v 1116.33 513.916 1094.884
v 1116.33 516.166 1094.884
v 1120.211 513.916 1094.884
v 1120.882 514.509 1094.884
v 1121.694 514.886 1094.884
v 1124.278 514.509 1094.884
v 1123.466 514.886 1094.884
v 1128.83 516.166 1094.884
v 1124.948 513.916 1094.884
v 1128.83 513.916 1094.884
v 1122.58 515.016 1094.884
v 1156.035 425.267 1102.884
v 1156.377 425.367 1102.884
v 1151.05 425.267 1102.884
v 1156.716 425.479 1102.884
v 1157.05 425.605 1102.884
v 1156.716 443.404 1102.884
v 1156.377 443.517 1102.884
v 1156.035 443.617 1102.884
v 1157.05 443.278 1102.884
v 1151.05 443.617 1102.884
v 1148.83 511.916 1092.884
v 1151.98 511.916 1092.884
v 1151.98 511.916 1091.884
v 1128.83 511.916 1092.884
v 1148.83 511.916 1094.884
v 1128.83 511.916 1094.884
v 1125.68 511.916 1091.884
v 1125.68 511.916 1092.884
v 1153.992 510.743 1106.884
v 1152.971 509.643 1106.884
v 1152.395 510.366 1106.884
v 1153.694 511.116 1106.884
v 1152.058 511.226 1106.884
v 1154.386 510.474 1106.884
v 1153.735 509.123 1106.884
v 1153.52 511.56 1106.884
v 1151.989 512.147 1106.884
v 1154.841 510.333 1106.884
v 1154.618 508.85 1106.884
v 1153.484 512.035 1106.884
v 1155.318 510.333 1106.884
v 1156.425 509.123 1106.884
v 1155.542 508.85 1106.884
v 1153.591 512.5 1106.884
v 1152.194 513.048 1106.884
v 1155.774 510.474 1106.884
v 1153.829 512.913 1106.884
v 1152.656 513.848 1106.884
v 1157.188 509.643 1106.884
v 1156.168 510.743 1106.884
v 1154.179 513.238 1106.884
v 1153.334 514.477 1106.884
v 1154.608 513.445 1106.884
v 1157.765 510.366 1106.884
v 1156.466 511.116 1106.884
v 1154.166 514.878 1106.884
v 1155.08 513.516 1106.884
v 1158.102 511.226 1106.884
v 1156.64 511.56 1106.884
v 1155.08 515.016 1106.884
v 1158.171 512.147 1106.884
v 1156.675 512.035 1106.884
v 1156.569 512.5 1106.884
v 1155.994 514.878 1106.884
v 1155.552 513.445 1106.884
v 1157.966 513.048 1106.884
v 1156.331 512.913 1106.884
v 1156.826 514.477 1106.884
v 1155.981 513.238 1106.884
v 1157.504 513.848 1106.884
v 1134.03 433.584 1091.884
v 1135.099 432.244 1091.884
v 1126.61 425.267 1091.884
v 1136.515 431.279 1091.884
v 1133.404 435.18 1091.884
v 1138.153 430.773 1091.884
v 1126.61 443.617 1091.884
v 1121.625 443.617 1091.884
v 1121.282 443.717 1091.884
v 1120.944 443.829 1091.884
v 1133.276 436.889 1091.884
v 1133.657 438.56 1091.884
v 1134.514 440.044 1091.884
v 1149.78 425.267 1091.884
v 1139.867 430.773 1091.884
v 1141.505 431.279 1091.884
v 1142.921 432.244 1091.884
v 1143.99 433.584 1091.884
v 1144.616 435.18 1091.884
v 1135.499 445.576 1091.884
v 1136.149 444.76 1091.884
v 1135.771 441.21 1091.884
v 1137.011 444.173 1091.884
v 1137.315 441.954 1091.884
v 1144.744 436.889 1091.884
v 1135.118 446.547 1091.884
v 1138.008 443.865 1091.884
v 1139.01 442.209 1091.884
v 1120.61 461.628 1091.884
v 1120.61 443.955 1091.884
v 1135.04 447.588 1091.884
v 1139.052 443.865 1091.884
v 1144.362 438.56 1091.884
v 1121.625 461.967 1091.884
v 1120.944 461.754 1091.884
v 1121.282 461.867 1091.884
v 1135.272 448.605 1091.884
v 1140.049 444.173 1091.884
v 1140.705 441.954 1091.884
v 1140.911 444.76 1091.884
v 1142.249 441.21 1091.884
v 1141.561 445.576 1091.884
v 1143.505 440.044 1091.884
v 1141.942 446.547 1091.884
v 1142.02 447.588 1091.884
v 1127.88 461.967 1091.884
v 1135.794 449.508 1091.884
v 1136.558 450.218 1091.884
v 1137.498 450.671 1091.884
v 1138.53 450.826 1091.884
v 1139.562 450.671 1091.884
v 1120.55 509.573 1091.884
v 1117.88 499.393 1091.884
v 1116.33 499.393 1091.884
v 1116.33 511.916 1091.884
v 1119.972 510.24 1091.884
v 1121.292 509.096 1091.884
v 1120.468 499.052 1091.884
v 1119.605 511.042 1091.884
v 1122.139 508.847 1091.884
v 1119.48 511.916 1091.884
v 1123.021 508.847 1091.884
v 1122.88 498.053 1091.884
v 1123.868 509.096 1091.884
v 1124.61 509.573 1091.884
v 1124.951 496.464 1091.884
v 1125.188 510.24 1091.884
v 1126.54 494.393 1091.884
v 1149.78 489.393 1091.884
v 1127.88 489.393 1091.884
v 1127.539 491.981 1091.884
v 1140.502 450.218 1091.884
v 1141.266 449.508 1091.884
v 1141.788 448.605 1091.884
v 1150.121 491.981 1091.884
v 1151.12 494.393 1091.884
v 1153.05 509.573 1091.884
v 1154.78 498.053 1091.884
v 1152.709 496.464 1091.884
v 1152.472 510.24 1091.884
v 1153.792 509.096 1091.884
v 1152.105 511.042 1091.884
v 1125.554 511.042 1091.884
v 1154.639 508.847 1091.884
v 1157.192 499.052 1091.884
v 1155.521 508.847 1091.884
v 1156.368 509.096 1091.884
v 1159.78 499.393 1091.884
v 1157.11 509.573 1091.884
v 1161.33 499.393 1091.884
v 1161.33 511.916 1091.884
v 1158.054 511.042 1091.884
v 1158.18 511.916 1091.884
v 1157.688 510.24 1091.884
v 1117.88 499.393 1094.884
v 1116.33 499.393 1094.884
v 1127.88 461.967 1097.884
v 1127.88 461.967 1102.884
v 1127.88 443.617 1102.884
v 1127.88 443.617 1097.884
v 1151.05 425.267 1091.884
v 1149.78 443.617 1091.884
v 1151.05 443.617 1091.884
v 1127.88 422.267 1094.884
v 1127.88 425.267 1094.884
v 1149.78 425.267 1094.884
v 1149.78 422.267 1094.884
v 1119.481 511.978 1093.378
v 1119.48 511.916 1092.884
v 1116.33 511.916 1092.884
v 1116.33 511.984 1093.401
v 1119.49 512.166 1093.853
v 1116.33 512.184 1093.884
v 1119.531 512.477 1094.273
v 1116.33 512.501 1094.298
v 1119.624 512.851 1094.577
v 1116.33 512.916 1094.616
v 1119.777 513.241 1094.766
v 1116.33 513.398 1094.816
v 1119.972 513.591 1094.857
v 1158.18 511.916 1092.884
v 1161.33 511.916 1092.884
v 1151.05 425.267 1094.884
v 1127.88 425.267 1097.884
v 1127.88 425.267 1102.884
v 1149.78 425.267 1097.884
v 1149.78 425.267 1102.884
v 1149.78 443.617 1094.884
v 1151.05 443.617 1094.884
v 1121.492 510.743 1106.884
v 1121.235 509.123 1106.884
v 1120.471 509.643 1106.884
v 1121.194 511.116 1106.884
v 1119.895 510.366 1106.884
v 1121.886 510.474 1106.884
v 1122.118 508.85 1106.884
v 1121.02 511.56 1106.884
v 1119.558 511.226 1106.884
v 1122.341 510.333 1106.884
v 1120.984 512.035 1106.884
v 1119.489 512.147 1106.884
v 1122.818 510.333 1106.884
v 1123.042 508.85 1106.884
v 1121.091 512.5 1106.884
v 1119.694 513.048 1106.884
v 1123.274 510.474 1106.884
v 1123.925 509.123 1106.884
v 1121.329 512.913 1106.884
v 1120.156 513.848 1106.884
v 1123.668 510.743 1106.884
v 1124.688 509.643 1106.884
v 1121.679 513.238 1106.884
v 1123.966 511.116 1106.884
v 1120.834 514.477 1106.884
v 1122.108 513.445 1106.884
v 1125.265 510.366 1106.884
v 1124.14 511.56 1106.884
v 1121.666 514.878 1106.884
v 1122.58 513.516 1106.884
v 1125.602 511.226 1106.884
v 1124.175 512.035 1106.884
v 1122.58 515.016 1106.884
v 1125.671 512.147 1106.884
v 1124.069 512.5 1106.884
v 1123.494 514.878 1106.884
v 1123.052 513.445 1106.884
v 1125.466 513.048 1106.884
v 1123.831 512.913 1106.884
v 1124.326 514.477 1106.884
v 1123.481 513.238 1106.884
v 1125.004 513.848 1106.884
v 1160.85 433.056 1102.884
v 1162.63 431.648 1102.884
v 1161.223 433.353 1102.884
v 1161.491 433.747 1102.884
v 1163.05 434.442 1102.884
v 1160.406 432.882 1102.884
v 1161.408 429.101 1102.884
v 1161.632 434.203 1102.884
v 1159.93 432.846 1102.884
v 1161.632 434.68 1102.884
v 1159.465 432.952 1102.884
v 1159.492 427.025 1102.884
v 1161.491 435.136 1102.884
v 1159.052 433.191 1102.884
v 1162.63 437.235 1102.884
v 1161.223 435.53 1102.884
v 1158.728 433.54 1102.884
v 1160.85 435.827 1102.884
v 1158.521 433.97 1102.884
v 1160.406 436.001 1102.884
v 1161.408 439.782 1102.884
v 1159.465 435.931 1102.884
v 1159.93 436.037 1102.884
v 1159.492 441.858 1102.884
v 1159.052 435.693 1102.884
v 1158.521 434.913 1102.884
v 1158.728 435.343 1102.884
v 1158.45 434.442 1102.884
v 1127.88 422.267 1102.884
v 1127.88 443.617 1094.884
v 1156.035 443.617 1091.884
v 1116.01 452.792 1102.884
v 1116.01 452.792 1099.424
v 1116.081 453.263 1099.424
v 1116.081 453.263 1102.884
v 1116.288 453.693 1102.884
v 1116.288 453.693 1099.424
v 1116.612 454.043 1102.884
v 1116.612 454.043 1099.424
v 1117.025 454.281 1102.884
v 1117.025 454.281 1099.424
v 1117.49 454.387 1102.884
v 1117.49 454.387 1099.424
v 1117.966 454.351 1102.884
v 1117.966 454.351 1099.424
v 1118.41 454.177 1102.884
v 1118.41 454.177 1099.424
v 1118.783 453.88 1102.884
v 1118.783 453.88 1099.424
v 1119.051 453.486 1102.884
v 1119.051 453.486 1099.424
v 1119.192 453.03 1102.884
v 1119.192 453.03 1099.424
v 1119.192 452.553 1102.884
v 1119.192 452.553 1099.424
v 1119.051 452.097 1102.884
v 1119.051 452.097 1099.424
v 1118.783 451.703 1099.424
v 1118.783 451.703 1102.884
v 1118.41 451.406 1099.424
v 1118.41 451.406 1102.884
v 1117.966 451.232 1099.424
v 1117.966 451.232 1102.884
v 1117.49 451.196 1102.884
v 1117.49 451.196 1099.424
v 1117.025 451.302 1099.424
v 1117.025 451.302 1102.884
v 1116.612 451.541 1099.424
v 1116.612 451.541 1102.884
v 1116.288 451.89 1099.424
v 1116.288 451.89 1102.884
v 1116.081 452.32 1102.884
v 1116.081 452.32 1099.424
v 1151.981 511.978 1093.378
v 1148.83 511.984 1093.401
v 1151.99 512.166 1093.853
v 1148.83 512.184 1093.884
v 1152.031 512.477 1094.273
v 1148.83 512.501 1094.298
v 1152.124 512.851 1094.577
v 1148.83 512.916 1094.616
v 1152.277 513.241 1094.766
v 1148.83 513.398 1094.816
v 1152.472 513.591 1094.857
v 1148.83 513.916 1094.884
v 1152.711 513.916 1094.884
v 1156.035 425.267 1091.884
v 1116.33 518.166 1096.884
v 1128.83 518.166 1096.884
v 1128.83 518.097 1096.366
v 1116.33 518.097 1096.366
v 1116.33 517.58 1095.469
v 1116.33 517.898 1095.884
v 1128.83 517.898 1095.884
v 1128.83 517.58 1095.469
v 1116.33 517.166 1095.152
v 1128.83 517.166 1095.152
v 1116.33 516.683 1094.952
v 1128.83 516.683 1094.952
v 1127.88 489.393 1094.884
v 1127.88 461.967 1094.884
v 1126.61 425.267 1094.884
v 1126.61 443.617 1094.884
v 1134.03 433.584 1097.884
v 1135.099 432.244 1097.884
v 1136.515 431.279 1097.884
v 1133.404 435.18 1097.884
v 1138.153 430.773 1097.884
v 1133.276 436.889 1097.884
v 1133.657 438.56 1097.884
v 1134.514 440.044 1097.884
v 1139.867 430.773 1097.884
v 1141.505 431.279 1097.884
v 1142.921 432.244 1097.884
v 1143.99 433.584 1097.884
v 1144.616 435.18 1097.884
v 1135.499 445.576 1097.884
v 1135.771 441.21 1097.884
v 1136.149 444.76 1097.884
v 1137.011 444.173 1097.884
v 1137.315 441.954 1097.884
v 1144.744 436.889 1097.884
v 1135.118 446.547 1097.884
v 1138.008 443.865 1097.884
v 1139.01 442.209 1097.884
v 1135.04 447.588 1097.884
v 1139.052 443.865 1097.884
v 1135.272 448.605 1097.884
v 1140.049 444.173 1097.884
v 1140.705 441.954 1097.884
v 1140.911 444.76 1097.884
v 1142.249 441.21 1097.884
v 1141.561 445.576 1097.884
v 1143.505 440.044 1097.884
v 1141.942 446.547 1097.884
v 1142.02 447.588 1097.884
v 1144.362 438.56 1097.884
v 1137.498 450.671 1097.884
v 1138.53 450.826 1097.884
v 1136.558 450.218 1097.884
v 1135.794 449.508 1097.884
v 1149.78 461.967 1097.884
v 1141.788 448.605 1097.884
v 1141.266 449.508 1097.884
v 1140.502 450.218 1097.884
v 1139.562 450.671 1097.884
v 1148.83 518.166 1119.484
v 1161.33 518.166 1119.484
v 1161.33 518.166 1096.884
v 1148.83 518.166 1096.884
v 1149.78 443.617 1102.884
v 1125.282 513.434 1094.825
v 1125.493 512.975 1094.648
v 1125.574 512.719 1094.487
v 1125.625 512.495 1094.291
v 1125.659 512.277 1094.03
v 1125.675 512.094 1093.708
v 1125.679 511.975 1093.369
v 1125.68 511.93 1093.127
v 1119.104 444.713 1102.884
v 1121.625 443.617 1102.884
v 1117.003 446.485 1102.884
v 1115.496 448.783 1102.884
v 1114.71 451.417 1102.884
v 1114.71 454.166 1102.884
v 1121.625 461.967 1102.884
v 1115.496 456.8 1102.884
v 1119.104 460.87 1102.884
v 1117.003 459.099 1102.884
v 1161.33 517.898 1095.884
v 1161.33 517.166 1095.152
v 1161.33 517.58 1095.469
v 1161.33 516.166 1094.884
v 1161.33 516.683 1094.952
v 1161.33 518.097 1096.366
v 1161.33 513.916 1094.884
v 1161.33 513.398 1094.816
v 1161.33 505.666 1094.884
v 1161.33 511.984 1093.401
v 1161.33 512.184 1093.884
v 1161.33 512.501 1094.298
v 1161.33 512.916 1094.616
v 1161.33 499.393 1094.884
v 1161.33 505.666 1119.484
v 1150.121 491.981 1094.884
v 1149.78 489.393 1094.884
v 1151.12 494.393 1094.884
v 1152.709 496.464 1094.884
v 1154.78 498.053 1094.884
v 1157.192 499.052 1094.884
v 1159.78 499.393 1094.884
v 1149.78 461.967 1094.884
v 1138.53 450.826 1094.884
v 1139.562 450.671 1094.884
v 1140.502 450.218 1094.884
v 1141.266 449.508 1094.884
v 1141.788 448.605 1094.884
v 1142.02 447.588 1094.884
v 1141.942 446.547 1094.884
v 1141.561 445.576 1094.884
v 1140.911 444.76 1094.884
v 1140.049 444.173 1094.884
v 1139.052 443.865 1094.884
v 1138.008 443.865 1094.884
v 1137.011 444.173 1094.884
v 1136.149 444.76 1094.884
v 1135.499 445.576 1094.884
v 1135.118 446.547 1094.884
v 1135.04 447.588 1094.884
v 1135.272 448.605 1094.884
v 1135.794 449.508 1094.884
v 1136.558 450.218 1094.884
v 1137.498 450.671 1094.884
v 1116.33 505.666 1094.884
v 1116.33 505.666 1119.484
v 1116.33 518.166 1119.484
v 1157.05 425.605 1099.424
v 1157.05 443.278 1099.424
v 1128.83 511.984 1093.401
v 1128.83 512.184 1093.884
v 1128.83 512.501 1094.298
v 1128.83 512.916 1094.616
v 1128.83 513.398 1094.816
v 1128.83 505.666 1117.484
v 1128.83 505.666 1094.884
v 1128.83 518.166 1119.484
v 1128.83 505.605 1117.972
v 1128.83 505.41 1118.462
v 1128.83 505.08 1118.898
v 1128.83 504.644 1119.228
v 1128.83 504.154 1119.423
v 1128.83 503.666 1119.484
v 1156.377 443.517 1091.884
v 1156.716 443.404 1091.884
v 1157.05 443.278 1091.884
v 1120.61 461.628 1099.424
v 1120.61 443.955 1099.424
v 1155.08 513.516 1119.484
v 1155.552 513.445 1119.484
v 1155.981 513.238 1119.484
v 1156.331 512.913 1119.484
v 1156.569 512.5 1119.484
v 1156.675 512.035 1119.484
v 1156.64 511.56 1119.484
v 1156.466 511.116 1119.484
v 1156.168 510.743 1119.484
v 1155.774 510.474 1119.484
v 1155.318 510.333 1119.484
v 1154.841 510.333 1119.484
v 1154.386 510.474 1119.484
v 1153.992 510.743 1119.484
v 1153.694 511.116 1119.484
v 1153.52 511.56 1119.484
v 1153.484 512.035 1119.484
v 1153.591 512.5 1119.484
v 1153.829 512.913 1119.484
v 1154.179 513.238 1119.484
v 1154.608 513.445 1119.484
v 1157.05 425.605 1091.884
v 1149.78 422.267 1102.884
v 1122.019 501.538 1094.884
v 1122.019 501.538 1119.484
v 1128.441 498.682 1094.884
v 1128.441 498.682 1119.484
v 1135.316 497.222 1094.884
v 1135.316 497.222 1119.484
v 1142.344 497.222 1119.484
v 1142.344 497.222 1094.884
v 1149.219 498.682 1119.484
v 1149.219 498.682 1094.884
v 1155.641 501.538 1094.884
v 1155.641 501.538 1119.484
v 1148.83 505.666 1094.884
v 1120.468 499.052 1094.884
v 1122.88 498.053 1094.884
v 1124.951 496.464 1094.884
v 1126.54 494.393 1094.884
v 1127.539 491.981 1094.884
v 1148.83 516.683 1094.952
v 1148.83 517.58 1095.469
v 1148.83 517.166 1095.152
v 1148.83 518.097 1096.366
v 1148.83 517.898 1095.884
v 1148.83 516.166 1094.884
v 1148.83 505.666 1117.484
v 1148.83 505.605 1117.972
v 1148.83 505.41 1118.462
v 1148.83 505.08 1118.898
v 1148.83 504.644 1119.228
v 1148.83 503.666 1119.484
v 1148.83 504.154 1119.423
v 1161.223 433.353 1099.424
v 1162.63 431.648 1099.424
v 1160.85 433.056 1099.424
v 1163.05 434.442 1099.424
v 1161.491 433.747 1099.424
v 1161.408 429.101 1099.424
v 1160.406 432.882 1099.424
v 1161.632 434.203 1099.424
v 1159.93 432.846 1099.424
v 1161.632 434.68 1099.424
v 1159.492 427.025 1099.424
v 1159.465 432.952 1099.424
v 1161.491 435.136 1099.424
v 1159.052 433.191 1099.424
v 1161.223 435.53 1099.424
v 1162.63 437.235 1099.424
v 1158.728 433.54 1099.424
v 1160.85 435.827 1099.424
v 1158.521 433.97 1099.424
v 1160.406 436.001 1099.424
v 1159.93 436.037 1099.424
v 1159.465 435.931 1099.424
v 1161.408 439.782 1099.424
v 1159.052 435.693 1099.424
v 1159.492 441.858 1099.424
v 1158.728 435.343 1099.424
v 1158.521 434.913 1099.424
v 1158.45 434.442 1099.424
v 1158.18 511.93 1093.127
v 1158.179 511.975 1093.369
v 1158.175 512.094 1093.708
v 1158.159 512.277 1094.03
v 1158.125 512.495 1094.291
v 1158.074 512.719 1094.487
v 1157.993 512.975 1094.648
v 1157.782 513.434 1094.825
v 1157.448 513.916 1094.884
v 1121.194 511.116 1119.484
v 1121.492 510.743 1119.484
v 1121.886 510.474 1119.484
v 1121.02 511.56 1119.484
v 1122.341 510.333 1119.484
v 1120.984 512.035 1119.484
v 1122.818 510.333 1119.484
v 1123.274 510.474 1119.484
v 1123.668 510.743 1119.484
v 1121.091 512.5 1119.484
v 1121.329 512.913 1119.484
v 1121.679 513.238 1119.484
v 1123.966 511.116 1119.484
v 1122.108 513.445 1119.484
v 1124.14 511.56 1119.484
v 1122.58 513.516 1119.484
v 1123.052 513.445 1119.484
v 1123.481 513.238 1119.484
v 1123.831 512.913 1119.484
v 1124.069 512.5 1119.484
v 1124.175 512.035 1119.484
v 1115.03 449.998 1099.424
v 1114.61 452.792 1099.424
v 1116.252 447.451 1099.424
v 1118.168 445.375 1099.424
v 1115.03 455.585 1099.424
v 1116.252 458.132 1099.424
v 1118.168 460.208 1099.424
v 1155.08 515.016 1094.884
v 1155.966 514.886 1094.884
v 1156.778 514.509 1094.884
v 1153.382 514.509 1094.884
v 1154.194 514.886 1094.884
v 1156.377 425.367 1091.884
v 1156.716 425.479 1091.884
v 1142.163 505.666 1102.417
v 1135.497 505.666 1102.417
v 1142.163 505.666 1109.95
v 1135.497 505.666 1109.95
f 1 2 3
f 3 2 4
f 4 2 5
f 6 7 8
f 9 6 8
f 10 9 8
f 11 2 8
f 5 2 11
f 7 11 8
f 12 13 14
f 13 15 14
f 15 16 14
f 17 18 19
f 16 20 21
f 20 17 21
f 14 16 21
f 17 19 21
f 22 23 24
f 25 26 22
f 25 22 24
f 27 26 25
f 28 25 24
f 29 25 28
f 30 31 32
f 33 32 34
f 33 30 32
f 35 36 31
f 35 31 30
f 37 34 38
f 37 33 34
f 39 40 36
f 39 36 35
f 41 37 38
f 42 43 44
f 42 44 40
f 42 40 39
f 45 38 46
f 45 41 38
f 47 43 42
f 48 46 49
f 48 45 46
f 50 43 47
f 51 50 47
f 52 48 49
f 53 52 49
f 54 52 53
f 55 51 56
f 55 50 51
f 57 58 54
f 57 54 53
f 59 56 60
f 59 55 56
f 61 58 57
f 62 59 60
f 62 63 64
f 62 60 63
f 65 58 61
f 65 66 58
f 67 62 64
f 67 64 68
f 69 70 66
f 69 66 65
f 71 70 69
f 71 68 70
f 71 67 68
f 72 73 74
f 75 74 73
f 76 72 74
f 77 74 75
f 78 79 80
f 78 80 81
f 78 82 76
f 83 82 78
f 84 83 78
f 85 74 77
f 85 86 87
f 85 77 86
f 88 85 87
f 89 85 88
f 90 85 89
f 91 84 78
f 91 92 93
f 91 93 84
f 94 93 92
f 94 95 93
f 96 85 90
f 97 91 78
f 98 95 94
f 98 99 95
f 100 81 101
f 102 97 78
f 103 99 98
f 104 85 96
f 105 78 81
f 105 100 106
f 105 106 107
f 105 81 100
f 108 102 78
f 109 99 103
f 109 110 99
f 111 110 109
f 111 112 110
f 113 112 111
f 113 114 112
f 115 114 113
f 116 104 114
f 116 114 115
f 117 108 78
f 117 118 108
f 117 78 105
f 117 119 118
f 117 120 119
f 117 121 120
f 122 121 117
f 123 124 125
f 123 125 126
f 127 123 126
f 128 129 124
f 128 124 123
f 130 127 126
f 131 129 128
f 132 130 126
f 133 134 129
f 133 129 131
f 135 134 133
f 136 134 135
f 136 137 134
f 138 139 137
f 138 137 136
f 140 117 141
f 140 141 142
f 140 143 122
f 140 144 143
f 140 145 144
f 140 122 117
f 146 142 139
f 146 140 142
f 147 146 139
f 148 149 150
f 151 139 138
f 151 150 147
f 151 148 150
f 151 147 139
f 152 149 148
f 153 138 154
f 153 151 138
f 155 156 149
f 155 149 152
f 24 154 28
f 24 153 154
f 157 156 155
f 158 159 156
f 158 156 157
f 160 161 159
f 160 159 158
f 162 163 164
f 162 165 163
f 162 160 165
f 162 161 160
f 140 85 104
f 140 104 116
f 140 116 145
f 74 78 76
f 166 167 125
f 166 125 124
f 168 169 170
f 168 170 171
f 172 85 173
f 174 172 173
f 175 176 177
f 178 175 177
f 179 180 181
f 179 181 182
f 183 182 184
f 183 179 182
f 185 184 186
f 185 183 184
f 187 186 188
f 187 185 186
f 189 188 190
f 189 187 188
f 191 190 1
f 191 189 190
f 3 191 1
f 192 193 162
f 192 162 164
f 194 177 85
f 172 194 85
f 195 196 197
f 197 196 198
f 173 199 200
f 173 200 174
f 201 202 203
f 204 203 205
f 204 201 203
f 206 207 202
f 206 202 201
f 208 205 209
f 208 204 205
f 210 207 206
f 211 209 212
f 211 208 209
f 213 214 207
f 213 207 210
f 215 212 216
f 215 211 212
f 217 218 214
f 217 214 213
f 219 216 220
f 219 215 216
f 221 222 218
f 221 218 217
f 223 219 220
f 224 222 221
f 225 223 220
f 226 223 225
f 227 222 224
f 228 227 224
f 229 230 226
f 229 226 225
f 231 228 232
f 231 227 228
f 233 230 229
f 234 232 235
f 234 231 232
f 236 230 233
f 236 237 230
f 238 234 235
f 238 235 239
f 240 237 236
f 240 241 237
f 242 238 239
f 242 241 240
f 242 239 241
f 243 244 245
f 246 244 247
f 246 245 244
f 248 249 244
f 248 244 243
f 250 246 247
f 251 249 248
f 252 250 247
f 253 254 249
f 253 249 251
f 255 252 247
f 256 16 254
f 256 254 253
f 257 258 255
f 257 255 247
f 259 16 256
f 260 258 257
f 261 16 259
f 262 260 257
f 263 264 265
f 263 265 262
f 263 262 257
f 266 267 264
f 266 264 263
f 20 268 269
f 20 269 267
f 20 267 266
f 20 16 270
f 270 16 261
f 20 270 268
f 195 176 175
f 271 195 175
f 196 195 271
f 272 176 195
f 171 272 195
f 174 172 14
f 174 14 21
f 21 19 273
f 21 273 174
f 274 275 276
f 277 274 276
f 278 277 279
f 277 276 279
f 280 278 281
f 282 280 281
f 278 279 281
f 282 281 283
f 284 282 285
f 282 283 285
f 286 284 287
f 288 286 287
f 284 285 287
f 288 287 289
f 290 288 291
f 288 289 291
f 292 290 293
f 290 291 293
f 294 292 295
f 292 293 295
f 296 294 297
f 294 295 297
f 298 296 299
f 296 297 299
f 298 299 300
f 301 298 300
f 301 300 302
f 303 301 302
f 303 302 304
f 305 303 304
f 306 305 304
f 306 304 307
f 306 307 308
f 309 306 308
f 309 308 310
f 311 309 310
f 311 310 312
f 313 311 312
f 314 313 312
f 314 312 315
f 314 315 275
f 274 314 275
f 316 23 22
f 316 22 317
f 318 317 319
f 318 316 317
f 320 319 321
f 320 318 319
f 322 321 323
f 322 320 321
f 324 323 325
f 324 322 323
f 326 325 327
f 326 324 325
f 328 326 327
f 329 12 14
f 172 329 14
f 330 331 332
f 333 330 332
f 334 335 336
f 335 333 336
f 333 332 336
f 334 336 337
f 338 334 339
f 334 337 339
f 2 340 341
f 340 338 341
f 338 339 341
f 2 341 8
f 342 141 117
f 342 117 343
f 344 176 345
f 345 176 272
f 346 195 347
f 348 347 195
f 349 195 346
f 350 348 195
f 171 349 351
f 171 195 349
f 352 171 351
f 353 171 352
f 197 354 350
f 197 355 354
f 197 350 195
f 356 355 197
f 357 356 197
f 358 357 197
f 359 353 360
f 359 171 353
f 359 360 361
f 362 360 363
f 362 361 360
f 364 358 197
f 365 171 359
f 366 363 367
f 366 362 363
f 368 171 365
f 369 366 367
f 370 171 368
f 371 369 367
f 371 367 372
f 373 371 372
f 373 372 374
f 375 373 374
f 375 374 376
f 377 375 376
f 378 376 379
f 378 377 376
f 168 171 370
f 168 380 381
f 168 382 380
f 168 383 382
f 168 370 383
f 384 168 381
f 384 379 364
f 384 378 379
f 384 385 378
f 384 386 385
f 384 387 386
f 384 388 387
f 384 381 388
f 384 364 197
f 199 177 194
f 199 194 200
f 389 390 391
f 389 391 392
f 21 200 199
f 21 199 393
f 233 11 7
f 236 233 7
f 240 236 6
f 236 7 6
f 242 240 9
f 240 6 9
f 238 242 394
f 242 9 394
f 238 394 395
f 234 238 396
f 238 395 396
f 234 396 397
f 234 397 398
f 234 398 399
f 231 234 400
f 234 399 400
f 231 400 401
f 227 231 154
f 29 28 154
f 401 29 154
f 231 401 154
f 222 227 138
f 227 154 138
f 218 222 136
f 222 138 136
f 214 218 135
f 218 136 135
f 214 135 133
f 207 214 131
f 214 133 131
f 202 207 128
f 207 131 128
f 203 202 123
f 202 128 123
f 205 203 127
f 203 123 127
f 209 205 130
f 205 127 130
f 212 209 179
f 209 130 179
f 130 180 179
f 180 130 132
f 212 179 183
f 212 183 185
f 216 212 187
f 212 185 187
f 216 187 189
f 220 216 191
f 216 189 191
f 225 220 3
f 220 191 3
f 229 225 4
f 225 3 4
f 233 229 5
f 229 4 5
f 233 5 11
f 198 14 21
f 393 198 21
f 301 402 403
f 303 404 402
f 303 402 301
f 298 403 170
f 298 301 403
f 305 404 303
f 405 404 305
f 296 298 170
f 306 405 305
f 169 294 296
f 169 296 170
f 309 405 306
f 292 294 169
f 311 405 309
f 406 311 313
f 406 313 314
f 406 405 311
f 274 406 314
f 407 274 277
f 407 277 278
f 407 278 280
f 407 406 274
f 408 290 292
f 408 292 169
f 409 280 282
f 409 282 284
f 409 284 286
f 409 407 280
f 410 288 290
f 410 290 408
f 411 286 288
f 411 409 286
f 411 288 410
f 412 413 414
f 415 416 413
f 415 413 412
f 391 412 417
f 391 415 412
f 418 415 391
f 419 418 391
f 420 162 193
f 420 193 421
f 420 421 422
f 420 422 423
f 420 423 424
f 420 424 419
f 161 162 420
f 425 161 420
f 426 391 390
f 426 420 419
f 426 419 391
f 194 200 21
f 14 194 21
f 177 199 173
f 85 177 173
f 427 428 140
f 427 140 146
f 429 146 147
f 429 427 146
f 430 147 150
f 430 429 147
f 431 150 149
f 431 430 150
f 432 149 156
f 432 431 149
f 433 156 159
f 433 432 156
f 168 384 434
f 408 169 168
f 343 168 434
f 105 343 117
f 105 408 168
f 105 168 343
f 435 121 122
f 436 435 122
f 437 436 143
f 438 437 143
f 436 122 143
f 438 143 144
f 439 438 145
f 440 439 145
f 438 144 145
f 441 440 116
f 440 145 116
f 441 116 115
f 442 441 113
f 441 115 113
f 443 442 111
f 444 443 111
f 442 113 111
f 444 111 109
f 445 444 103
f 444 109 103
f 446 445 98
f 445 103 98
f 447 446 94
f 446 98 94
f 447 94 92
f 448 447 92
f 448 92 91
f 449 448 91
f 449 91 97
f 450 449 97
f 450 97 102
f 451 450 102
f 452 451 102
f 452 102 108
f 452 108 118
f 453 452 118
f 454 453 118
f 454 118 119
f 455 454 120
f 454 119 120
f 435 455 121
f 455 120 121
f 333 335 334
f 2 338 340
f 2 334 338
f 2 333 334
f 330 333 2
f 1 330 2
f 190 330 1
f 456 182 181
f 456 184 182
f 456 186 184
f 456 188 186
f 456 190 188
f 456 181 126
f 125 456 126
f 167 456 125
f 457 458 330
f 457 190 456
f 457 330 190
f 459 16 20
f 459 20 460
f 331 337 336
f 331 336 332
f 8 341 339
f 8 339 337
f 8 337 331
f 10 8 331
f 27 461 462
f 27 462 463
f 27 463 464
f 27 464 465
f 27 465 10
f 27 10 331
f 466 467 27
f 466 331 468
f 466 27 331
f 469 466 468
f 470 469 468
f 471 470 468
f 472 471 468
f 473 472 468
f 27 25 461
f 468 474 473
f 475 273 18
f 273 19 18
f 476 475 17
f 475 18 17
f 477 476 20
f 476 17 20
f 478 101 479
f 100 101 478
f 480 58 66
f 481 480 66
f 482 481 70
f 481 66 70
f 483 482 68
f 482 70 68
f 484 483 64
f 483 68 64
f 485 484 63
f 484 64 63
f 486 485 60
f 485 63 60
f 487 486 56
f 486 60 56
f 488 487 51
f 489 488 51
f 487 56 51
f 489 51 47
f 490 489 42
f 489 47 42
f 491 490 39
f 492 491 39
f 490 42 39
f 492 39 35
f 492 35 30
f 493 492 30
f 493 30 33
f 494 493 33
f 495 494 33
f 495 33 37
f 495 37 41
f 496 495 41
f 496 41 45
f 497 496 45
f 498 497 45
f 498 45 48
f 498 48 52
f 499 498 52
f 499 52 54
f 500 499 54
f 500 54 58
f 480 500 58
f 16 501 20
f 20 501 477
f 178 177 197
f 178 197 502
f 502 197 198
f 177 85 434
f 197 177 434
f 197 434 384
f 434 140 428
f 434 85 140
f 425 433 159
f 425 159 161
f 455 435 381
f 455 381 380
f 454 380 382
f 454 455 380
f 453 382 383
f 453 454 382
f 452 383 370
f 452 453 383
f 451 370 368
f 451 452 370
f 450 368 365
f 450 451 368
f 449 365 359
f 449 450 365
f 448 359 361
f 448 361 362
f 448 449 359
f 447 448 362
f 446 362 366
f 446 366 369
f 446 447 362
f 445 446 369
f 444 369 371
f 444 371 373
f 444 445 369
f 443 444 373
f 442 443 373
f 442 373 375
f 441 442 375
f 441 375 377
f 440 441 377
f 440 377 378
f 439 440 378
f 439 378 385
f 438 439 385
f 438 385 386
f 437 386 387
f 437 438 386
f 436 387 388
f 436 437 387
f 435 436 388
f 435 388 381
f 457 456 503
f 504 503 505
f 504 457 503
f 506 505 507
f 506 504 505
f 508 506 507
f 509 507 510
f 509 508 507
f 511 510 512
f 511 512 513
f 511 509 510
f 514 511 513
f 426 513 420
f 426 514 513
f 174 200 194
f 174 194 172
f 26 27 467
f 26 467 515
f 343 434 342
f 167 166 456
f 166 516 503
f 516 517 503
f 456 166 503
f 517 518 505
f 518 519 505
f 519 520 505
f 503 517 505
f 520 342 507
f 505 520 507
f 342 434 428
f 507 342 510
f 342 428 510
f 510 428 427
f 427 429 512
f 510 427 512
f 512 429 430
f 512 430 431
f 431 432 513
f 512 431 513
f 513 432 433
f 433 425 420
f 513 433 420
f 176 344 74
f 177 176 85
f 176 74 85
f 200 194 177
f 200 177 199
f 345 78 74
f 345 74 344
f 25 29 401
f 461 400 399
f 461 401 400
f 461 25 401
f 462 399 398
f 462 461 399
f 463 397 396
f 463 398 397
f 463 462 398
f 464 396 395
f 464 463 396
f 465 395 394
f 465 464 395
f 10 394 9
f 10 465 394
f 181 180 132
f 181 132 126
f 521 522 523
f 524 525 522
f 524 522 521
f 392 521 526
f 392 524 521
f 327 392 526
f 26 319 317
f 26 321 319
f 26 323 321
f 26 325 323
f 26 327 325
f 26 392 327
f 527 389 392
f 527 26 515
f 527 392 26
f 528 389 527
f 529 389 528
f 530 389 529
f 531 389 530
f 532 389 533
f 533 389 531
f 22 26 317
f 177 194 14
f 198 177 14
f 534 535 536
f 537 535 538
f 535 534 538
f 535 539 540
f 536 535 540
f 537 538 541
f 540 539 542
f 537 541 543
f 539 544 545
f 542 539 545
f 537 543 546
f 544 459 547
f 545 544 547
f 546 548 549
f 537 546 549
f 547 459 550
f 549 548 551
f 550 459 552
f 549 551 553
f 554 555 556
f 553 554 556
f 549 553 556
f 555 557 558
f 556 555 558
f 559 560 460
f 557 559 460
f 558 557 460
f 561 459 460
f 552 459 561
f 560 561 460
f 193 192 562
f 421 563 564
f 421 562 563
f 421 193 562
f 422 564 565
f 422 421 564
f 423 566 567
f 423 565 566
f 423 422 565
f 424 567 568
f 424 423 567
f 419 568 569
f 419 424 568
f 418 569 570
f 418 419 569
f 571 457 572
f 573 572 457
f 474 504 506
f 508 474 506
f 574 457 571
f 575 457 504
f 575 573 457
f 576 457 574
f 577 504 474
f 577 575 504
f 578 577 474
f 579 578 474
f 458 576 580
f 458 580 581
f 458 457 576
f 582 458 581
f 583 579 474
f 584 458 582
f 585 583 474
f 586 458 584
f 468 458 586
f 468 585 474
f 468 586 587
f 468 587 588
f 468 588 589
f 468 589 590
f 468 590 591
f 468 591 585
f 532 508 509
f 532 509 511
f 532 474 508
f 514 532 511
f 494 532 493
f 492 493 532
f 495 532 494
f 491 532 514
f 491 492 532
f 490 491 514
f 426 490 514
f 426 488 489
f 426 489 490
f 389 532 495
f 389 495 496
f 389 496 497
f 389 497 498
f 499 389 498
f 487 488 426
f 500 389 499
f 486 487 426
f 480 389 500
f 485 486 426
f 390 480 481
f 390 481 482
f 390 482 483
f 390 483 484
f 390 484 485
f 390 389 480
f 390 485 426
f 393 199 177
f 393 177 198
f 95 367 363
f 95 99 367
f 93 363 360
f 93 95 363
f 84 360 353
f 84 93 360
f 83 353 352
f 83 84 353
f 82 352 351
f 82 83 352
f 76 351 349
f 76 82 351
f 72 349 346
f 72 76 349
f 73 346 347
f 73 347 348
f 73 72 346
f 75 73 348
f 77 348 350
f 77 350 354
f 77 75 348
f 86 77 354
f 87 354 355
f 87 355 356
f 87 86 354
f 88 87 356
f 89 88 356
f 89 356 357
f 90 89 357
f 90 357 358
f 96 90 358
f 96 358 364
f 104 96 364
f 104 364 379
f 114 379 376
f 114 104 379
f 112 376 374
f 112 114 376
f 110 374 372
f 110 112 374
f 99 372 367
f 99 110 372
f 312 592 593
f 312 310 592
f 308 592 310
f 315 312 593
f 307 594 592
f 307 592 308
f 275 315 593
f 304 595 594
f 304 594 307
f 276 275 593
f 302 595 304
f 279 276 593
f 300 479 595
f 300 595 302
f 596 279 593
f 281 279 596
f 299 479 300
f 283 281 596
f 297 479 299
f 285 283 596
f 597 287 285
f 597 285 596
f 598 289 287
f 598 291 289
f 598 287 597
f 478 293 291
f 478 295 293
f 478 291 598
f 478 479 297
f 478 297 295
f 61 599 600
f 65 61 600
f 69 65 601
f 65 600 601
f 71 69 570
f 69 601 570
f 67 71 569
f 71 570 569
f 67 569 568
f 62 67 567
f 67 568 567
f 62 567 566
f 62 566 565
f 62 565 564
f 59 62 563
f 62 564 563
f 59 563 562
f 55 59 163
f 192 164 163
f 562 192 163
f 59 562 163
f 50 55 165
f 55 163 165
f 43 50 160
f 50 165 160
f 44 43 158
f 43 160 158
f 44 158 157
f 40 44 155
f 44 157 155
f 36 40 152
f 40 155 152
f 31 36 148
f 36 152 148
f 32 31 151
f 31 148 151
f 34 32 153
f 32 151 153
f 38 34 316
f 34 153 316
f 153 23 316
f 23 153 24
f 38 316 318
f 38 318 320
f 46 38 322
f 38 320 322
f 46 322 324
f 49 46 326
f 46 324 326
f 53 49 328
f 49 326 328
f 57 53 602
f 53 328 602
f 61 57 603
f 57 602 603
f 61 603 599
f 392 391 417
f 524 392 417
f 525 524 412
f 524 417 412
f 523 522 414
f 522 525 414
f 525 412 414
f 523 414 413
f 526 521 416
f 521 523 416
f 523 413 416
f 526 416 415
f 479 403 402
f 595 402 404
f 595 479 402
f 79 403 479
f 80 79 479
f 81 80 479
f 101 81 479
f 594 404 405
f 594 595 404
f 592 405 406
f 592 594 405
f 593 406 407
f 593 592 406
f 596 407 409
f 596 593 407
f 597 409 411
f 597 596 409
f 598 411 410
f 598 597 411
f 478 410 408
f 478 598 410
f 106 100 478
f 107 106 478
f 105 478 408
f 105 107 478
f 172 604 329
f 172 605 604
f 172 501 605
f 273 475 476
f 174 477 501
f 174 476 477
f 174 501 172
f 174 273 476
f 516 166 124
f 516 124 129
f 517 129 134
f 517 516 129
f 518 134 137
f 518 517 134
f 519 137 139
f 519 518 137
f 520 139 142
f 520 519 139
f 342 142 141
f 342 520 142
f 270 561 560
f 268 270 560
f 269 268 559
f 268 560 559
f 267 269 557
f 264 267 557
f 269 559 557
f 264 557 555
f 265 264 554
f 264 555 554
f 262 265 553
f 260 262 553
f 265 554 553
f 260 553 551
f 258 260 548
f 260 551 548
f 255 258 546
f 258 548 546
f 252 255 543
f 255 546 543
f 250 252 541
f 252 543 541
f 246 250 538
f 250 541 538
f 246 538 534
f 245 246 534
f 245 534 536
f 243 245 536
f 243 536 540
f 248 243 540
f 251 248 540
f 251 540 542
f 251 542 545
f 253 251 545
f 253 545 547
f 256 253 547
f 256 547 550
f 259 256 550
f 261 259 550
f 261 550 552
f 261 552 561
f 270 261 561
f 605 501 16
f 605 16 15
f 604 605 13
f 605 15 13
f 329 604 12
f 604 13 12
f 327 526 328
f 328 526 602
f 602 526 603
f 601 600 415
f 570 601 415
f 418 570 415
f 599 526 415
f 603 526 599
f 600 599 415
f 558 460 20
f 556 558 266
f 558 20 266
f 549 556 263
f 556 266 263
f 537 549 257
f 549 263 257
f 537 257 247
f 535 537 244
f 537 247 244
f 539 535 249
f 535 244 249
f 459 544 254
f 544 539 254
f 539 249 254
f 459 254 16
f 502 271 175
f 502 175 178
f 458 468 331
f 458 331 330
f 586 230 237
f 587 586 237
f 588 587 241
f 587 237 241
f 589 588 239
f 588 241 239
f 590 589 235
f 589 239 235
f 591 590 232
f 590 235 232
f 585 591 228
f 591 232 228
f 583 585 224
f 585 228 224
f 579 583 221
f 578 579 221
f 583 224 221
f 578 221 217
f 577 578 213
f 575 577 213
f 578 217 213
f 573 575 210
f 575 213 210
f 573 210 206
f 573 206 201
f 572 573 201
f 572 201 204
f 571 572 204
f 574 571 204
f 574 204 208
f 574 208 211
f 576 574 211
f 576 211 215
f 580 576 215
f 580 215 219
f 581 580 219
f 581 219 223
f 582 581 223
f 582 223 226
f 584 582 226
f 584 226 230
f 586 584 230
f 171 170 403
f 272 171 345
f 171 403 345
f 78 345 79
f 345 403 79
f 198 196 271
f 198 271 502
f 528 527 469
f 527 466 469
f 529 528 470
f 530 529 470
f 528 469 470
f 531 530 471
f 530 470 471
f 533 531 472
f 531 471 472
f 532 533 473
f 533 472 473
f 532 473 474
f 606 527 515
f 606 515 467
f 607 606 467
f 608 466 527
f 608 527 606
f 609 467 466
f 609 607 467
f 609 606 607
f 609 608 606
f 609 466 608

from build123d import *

# Parameters (mm, degrees)
BOSS_EXTRUDE1_DEPTH     = 24.6
BOSS_EXTRUDE2_DEPTH     = 3
SKETCH5_W               = 21.9
SKETCH5_H               = 3
BOSS_EXTRUDE3_DEPTH     = 37
CUT_EXTRUDE1_REACH      = 1273.984
SKETCH7_R               = 5.75
SKETCH8_W               = 3
SKETCH8_H               = 36.7
BOSS_EXTRUDE4_DEPTH     = 1.27
SKETCH9_W               = 3
SKETCH9_H               = 18.35
BOSS_EXTRUDE5_DEPTH     = 6
SKETCH11_W              = 6
SKETCH11_H              = 18.35
BOSS_EXTRUDE6_DEPTH     = 8
SKETCH12_W              = 6
SKETCH12_H              = 18.35
BOSS_EXTRUDE7_DEPTH     = 6
SKETCH14_R              = 1.6
CUT_EXTRUDE2_DEPTH      = 1272.885826469
CUT_EXTRUDE3_DEPTH      = 1272.984495021
SKETCH17_R              = 1.6
CUT_EXTRUDE4_DEPTH      = 1272.984495021
FILLET5_R               = 2
SKETCH18_R              = 3.1
CUT_EXTRUDE5_DEPTH      = 15
FILLET8_R               = 2
SKETCH19_W              = 3
SKETCH19_H              = 18.35
BOSS_EXTRUDE9_DEPTH     = 1.27
SKETCH20_W              = 6
SKETCH20_H              = 18.35
BOSS_EXTRUDE10_DEPTH    = 11
SKETCH21_W              = 6
SKETCH21_H              = 18.35
BOSS_EXTRUDE12_DEPTH    = 6
SKETCH22_R              = 1.6
CUT_EXTRUDE6_DEPTH      = 1274.45651229
CUT_EXTRUDE7_DEPTH      = 1274.45651229
CUT_EXTRUDE7_DEPTH_BACK = 1274.45651229
SKETCH24_R              = 3.5
CUT_EXTRUDE9_DEPTH      = 3
SKETCH25_W              = 21.9
SKETCH25_H              = 36.7
SKETCH25_R              = 5.75
SKETCH25_R_2            = 3.5
BOSS_EXTRUDE13_DEPTH    = 3
SKETCH26_W              = 21.9
SKETCH26_H              = 8
BOSS_EXTRUDE14_DEPTH    = 3
SKETCH27_W              = 8
SKETCH27_H              = 18.35
BOSS_EXTRUDE15_DEPTH    = 1.27
SKETCH28_W              = 8
SKETCH28_H              = 18.35
BOSS_EXTRUDE17_DEPTH    = 1.27
SKETCH31_W              = 2.54
SKETCH31_H              = 17.673744651
CUT_EXTRUDE16_DEPTH     = 1235.317826103
SKETCH32_W              = 7.54
SKETCH32_H              = 18.35
CUT_EXTRUDE17_DEPTH     = 1235.317826103


with BuildPart() as part:
    # Sketch1 → Boss-Extrude1 (new body)
    with BuildSketch(Plane(origin=(0, 0, 1119.483697074), x_dir=(-1, 0, 0), z_dir=(0, 0, -1))):
        with BuildLine():
            Line((-1161.329927858, 505.6656047), (-1161.329927858, 518.1656047))
            Line((-1161.329927858, 518.1656047), (-1148.829927858, 518.1656047))
            Line((-1148.829927858, 518.1656047), (-1148.829927858, 505.6656047))
            add(Edge.make_bspline(
                [(-1148.829927858, 505.6656047), (-1142.163261192, 505.6656047), (-1135.496594525, 505.6656047), (-1128.829927858, 505.6656047)],
                knots=[0.277777778, 0.277777778, 0.277777778, 0.277777778, 0.722222222, 0.722222222, 0.722222222, 0.722222222], degree=3))
            Line((-1128.829927858, 505.6656047), (-1128.829927858, 518.1656047))
            Line((-1128.829927858, 518.1656047), (-1116.329927858, 518.1656047))
            Line((-1116.329927858, 518.1656047), (-1116.329927858, 505.6656047))
            ThreePointArc((-1116.329927858, 505.6656047), (-1138.829927858, 497.038297899), (-1161.329927858, 505.6656047))
        make_face()
    extrude(amount=BOSS_EXTRUDE1_DEPTH)

    # Sketch4 → Boss-Extrude2 (add)
    with BuildSketch(Plane(origin=(0, 0, 1094.883697074), x_dir=(-1, 0, 0), z_dir=(0, 0, -1))):
        with BuildLine():
            Line((-1149.779927858, 462.266600027), (-1149.779927858, 489.392833753))
            ThreePointArc((-1149.779927858, 489.392833753), (-1152.708860047, 496.463901565), (-1159.779927858, 499.392833753))
            Line((-1159.779927858, 499.392833753), (-1161.329927858, 499.392833753))
            Line((-1161.329927858, 499.392833753), (-1161.329927858, 511.9156047))
            Line((-1161.329927858, 511.9156047), (-1116.329927858, 511.9156047))
            Line((-1116.329927858, 511.9156047), (-1116.329927858, 499.392833753))
            Line((-1116.329927858, 499.392833753), (-1117.879927858, 499.392833753))
            ThreePointArc((-1117.879927858, 499.392833753), (-1124.95099567, 496.463901565), (-1127.879927858, 489.392833753))
            Line((-1127.879927858, 489.392833753), (-1127.879927858, 462.266600027))
            Line((-1127.879927858, 462.266600027), (-1149.779927858, 462.266600027))
        make_face()
    extrude(amount=BOSS_EXTRUDE2_DEPTH)

    # Sketch5 → Boss-Extrude3 (add)
    with BuildSketch(Plane.XZ.offset(-462.266600027)):
        with Locations((1138.829927858, 1093.383697074)):
            Rectangle(SKETCH5_W, SKETCH5_H)
    extrude(amount=BOSS_EXTRUDE3_DEPTH)

    # Sketch7 → Cut-Extrude1 (cut, up to next)
    with BuildSketch(Plane(origin=(0, 0, 1091.883697074), x_dir=(-1, 0, 0), z_dir=(0, 0, -1)), mode=Mode.PRIVATE) as cut_extrude1_sk1:
        with Locations(Location((-1139.009861583, 436.459083358, 0), (0, 0, 90))):
            Circle(SKETCH7_R)
    cut_extrude1_tool1 = extrude(cut_extrude1_sk1.sketch, amount=-CUT_EXTRUDE1_REACH, mode=Mode.PRIVATE) & part.part
    add(cut_extrude1_tool1.solids().sort_by_distance((1139.009862, 436.459083, 1091.883697))[0], mode=Mode.SUBTRACT)



with BuildPart() as body_2:
    # Sketch8 → Boss-Extrude4 (new body)
    with BuildSketch(Plane.ZY.offset(-1127.879927858)):
        with Locations((1093.383697074, 443.616600027)):
            Rectangle(SKETCH8_W, SKETCH8_H)
    extrude(amount=BOSS_EXTRUDE4_DEPTH)


with BuildPart() as part_1:
    add(part.part)

    add(body_2.part)  # Boss-Extrude5 merges body 2
    # Sketch9 → Boss-Extrude5 (add)
    with BuildSketch(Plane.ZY.offset(-1126.609927858)):
        with Locations((1093.383697074, 452.791600027)):
            Rectangle(SKETCH9_W, SKETCH9_H)
    extrude(amount=BOSS_EXTRUDE5_DEPTH)

    # Sketch11 → Boss-Extrude6 (add)
    with BuildSketch(Plane.XY.offset(1094.883697074)):
        with Locations((1123.609927858, 452.791600027)):
            Rectangle(SKETCH11_W, SKETCH11_H)
    extrude(amount=BOSS_EXTRUDE6_DEPTH)

    # Sketch12 → Boss-Extrude7 (add)
    with BuildSketch(Plane.ZY.offset(-1120.609927858)):
        with Locations((1099.883697074, 452.791600027)):
            Rectangle(SKETCH12_W, SKETCH12_H)
    extrude(amount=BOSS_EXTRUDE7_DEPTH)

    # Sketch14 → Cut-Extrude2 (cut, through all)
    with BuildSketch(Plane(origin=(0, 0, 1096.883697074), x_dir=(-1, 0, 0), z_dir=(0, 0, -1))):
        with Locations((-1117.609927858, 452.791600027)):
            Circle(SKETCH14_R)
    extrude(amount=-CUT_EXTRUDE2_DEPTH, mode=Mode.SUBTRACT)

    # Sketch16 → Cut-Extrude3 (cut, through all)
    with BuildSketch(Plane(origin=(0, 0, 1091.883697074), x_dir=(-1, 0, 0), z_dir=(0, 0, -1))):
        with BuildLine():
            Line((-1126.609927858, 461.966600027), (-1126.609927858, 463.878724732))
            Line((-1126.609927858, 463.878724732), (-1111.609927858, 463.878724732))
            Line((-1111.609927858, 463.878724732), (-1111.609927858, 441.878724732))
            Line((-1111.609927858, 441.878724732), (-1126.609927858, 441.878724732))
            Line((-1126.609927858, 441.878724732), (-1126.609927858, 443.616600027))
            ThreePointArc((-1126.609927858, 443.616600027), (-1114.609927858, 452.791600027), (-1126.609927858, 461.966600027))
        make_face()
    extrude(amount=-CUT_EXTRUDE3_DEPTH, mode=Mode.SUBTRACT)

    # Sketch17 → Cut-Extrude4 (cut, through all)
    with BuildSketch(Plane(origin=(0, 0, 1091.883697074), x_dir=(-1, 0, 0), z_dir=(0, 0, -1))):
        with Locations(Location((-1122.579927858, 511.9156047, 0), (0, 0, 90))):
            Circle(SKETCH17_R)
        with Locations(Location((-1155.079927858, 511.9156047, 0), (0, 0, 90))):
            Circle(SKETCH17_R)
    extrude(amount=-CUT_EXTRUDE4_DEPTH, mode=Mode.SUBTRACT)

    # Fillet5
    # the kernel refuses this fillet: 2 mm, written as the material it adds along each edge
    with BuildSketch(Plane(origin=(1128.829927858, 511.9156047, 1094.883697074), x_dir=(0, 0, -1), z_dir=(-1, 0, 0))) as fillet5_piece_1_section:
        with BuildLine():
            CenterArc((FILLET5_R, -FILLET5_R), FILLET5_R, 90, 90)
            Line((0, -FILLET5_R), (0, 0))
            Line((0, 0), (FILLET5_R, 0))
        make_face()
    fillet5_piece_1 = extrude(amount=9.65, mode=Mode.PRIVATE)
    fillet5_piece_1 = fillet5_piece_1 - Plane(origin=(1122.579927858, 511.9156047, 1094.447824363), x_dir=(0, 1, 0), z_dir=(0, 0, -1)) * Cylinder(1.6, 28, mode=Mode.PRIVATE)
    add(fillet5_piece_1)
    with BuildSketch(Plane(origin=(1161.329927858, 511.9156047, 1094.883697074), x_dir=(0, 0, -1), z_dir=(-1, 0, 0))) as fillet5_piece_2_section:
        with BuildLine():
            CenterArc((FILLET5_R, -FILLET5_R), FILLET5_R, 90, 90)
            Line((0, -FILLET5_R), (0, 0))
            Line((0, 0), (FILLET5_R, 0))
        make_face()
    fillet5_piece_2 = extrude(amount=9.65, mode=Mode.PRIVATE)
    fillet5_piece_2 = fillet5_piece_2 - Plane(origin=(1155.079927858, 511.9156047, 1094.447824363), x_dir=(0, 1, 0), z_dir=(0, 0, -1)) * Cylinder(1.6, 28, mode=Mode.PRIVATE)
    add(fillet5_piece_2)
    with BuildSketch(Plane(origin=(1158.479927859, 511.9156047, 1094.883697074), x_dir=(0, 0, -1), z_dir=(-1, 0, 0))) as fillet5_piece_3_section:
        with BuildLine():
            CenterArc((FILLET5_R, -FILLET5_R), FILLET5_R, 90, 90)
            Line((0, -FILLET5_R), (0, 0))
            Line((0, 0), (FILLET5_R, 0))
        make_face()
    fillet5_piece_3 = extrude(amount=9.65, mode=Mode.PRIVATE)
    fillet5_piece_3 = fillet5_piece_3 - Plane(origin=(1155.079927858, 511.9156047, 1094.447824598), x_dir=(0, 1, 0), z_dir=(0, 0, -1)) * Cylinder(1.6, 28, mode=Mode.PRIVATE)
    add(fillet5_piece_3)
    with BuildSketch(Plane(origin=(1125.979927859, 511.9156047, 1094.883697074), x_dir=(0, 0, -1), z_dir=(-1, 0, 0))) as fillet5_piece_4_section:
        with BuildLine():
            CenterArc((FILLET5_R, -FILLET5_R), FILLET5_R, 90, 90)
            Line((0, -FILLET5_R), (0, 0))
            Line((0, 0), (FILLET5_R, 0))
        make_face()
    fillet5_piece_4 = extrude(amount=9.65, mode=Mode.PRIVATE)
    fillet5_piece_4 = fillet5_piece_4 - Plane(origin=(1122.579927858, 511.9156047, 1094.447824598), x_dir=(0, 1, 0), z_dir=(0, 0, -1)) * Cylinder(1.6, 28, mode=Mode.PRIVATE)
    add(fillet5_piece_4)
    # the kernel refuses this fillet: 2 mm, written as the material it takes off along each edge
    with BuildSketch(Plane(origin=(1133.829927858, 518.1656047, 1094.883697074), x_dir=(0, -1, 0), z_dir=(-1, 0, 0))) as fillet5_2_piece_1:
        with BuildLine():
            CenterArc((FILLET5_R, FILLET5_R), FILLET5_R, 180, 90)
            Line((0, FILLET5_R), (0, 0))
            Line((0, 0), (FILLET5_R, 0))
        make_face()
    extrude(amount=22.5, mode=Mode.SUBTRACT)
    with BuildSketch(Plane(origin=(1166.329927858, 518.1656047, 1094.883697074), x_dir=(0, 0, 1), z_dir=(-1, 0, 0))) as fillet5_2_piece_2:
        with BuildLine():
            CenterArc((FILLET5_R, -FILLET5_R), FILLET5_R, 90, 90)
            Line((0, -FILLET5_R), (0, 0))
            Line((0, 0), (FILLET5_R, 0))
        make_face()
    extrude(amount=22.5, mode=Mode.SUBTRACT)

    # Sketch18 → Cut-Extrude5 (cut)
    with BuildSketch(Plane(origin=(0, 0, 1091.883697074), x_dir=(-1, 0, 0), z_dir=(0, 0, -1))):
        with Locations(Location((-1155.079927858, 511.9156047, 0), (0, 0, 90))):
            Circle(SKETCH18_R)
        with Locations(Location((-1122.579927858, 511.9156047, 0), (0, 0, 90))):
            Circle(SKETCH18_R)
    extrude(amount=-CUT_EXTRUDE5_DEPTH, mode=Mode.SUBTRACT)

    # Fillet8
    fillet8_edges = [part_1.edges().sort_by_distance(p)[0] for p in [
        (1138.829927858, 505.6656047, 1119.483697074),
    ]]
    fillet(fillet8_edges, radius=FILLET8_R)

    # Sketch24 → Cut-Extrude9 (cut)
    with BuildSketch(Plane(origin=(0, 0, 1091.883697074), x_dir=(-1, 0, 0), z_dir=(0, 0, -1))):
        with Locations(Location((-1138.529927858, 447.326151989, 0), (0, 0, 90))):
            Circle(SKETCH24_R)
    extrude(amount=-CUT_EXTRUDE9_DEPTH, mode=Mode.SUBTRACT)



with BuildPart() as body_2_2:
    # Sketch19 → Boss-Extrude9 (new body)
    with BuildSketch(Plane(origin=(1149.779927858, 0, 0), x_dir=(0, 0, -1), z_dir=(1, 0, 0))):
        with Locations((-1093.383697074, 434.441600027)):
            Rectangle(SKETCH19_W, SKETCH19_H)
    extrude(amount=BOSS_EXTRUDE9_DEPTH)


with BuildPart() as body_3:
    # Sketch20 → Boss-Extrude10 (new body)
    with BuildSketch(Plane(origin=(0, 0, 1091.883697074), x_dir=(-1, 0, 0), z_dir=(0, 0, -1))):
        with Locations((-1154.049927858, 434.441600027)):
            Rectangle(SKETCH20_W, SKETCH20_H)
    extrude(amount=-BOSS_EXTRUDE10_DEPTH)


with BuildPart() as body_4:
    # Sketch21 → Boss-Extrude12 (new body)
    with BuildSketch(Plane(origin=(1157.049927858, 0, 0), x_dir=(0, 0, -1), z_dir=(1, 0, 0))):
        with Locations((-1099.883697074, 434.441600027)):
            Rectangle(SKETCH21_W, SKETCH21_H)
    extrude(amount=BOSS_EXTRUDE12_DEPTH)

    # Sketch22 → Cut-Extrude6 (cut, through all)
    with BuildSketch(Plane(origin=(0, 0, 1096.883697074), x_dir=(-1, 0, 0), z_dir=(0, 0, -1))):
        with Locations((-1160.049927858, 434.441600027)):
            Circle(SKETCH22_R)
    extrude(amount=-CUT_EXTRUDE6_DEPTH, mode=Mode.SUBTRACT)


with BuildPart() as cut_extrude7_tool:
    # Sketch23 → Cut-Extrude7 (new, two sides: drawn at the far end of the back side and taken through both)
    with BuildSketch(Plane(origin=(0, 0, 1096.883697074), x_dir=(-1, 0, 0), z_dir=(0, 0, -1)).offset(-CUT_EXTRUDE7_DEPTH_BACK)):
        with BuildLine():
            Line((-1151.049927858, 425.266600027), (-1151.049927858, 419.441600027))
            Line((-1151.049927858, 419.441600027), (-1166.049927858, 419.441600027))
            Line((-1166.049927858, 419.441600027), (-1166.049927858, 449.441600027))
            Line((-1166.049927858, 449.441600027), (-1151.049927858, 449.441600027))
            Line((-1151.049927858, 449.441600027), (-1151.049927858, 443.616600027))
            ThreePointArc((-1151.049927858, 443.616600027), (-1163.049927858, 434.441600027), (-1151.049927858, 425.266600027))
        make_face()
    extrude(amount=CUT_EXTRUDE7_DEPTH + CUT_EXTRUDE7_DEPTH_BACK)


with BuildPart() as body_3_1:
    add(body_3.part)

    # Cut-Extrude7: cut by cut_extrude7_tool
    add(cut_extrude7_tool.part, mode=Mode.SUBTRACT)


with BuildPart() as body_4_1:
    add(body_4.part)

    # Cut-Extrude7: cut by cut_extrude7_tool
    add(cut_extrude7_tool.part, mode=Mode.SUBTRACT)

    # Sketch31 → Cut-Extrude16 (cut, through all)
    with BuildSketch(Plane(origin=(1157.049927858, 0, 0), x_dir=(0, 0, -1), z_dir=(1, 0, 0))):
        with Locations((-1098.153697074, 434.441600027)):
            Rectangle(SKETCH31_W, SKETCH31_H)
    extrude(amount=CUT_EXTRUDE16_DEPTH, mode=Mode.SUBTRACT)


with BuildPart() as body_5:
    # Sketch25 → Boss-Extrude13 (new body)
    with BuildSketch(Plane.XY.offset(1094.883697074)):
        with Locations((1138.829927858, 443.616600027)):
            Rectangle(SKETCH25_W, SKETCH25_H)
        with Locations(Location((1139.009861583, 436.459083358, 0), (0, 0, 90))):
            Circle(SKETCH25_R, mode=Mode.SUBTRACT)
        with Locations(Location((1138.529927858, 447.326151989, 0), (0, 0, 90))):
            Circle(SKETCH25_R_2, mode=Mode.SUBTRACT)
    extrude(amount=BOSS_EXTRUDE13_DEPTH)


with BuildPart() as part_2:
    add(part_1.part)

    add(body_5.part)  # Boss-Extrude14 merges body 5
    # Sketch26 → Boss-Extrude14 (add)
    with BuildSketch(Plane.XZ.offset(-425.266600027)):
        with Locations((1138.829927858, 1098.883697074)):
            Rectangle(SKETCH26_W, SKETCH26_H)
    extrude(amount=BOSS_EXTRUDE14_DEPTH)

    # Sketch27 → Boss-Extrude15 (add)
    with BuildSketch(Plane(origin=(1126.609927858, 0, 0), x_dir=(0, 0, -1), z_dir=(1, 0, 0))):
        with Locations((-1098.883697074, 452.791600027)):
            Rectangle(SKETCH27_W, SKETCH27_H)
    extrude(amount=BOSS_EXTRUDE15_DEPTH)

    # Sketch32 → Cut-Extrude17 (cut, through all)
    with BuildSketch(Plane.ZY.offset(-1120.609927858)):
        with Locations((1095.653697074, 452.791600027)):
            Rectangle(SKETCH32_W, SKETCH32_H)
    extrude(amount=CUT_EXTRUDE17_DEPTH, mode=Mode.SUBTRACT)


with BuildPart() as body_5_2:
    # Sketch28 → Boss-Extrude17 (new body)
    with BuildSketch(Plane.ZY.offset(-1151.049927858)):
        with Locations((1098.883697074, 434.441600027)):
            Rectangle(SKETCH28_W, SKETCH28_H)
    extrude(amount=BOSS_EXTRUDE17_DEPTH)


solid = Compound([body_2_2.part, body_3_1.part, body_4_1.part, part_2.part, body_5_2.part])
